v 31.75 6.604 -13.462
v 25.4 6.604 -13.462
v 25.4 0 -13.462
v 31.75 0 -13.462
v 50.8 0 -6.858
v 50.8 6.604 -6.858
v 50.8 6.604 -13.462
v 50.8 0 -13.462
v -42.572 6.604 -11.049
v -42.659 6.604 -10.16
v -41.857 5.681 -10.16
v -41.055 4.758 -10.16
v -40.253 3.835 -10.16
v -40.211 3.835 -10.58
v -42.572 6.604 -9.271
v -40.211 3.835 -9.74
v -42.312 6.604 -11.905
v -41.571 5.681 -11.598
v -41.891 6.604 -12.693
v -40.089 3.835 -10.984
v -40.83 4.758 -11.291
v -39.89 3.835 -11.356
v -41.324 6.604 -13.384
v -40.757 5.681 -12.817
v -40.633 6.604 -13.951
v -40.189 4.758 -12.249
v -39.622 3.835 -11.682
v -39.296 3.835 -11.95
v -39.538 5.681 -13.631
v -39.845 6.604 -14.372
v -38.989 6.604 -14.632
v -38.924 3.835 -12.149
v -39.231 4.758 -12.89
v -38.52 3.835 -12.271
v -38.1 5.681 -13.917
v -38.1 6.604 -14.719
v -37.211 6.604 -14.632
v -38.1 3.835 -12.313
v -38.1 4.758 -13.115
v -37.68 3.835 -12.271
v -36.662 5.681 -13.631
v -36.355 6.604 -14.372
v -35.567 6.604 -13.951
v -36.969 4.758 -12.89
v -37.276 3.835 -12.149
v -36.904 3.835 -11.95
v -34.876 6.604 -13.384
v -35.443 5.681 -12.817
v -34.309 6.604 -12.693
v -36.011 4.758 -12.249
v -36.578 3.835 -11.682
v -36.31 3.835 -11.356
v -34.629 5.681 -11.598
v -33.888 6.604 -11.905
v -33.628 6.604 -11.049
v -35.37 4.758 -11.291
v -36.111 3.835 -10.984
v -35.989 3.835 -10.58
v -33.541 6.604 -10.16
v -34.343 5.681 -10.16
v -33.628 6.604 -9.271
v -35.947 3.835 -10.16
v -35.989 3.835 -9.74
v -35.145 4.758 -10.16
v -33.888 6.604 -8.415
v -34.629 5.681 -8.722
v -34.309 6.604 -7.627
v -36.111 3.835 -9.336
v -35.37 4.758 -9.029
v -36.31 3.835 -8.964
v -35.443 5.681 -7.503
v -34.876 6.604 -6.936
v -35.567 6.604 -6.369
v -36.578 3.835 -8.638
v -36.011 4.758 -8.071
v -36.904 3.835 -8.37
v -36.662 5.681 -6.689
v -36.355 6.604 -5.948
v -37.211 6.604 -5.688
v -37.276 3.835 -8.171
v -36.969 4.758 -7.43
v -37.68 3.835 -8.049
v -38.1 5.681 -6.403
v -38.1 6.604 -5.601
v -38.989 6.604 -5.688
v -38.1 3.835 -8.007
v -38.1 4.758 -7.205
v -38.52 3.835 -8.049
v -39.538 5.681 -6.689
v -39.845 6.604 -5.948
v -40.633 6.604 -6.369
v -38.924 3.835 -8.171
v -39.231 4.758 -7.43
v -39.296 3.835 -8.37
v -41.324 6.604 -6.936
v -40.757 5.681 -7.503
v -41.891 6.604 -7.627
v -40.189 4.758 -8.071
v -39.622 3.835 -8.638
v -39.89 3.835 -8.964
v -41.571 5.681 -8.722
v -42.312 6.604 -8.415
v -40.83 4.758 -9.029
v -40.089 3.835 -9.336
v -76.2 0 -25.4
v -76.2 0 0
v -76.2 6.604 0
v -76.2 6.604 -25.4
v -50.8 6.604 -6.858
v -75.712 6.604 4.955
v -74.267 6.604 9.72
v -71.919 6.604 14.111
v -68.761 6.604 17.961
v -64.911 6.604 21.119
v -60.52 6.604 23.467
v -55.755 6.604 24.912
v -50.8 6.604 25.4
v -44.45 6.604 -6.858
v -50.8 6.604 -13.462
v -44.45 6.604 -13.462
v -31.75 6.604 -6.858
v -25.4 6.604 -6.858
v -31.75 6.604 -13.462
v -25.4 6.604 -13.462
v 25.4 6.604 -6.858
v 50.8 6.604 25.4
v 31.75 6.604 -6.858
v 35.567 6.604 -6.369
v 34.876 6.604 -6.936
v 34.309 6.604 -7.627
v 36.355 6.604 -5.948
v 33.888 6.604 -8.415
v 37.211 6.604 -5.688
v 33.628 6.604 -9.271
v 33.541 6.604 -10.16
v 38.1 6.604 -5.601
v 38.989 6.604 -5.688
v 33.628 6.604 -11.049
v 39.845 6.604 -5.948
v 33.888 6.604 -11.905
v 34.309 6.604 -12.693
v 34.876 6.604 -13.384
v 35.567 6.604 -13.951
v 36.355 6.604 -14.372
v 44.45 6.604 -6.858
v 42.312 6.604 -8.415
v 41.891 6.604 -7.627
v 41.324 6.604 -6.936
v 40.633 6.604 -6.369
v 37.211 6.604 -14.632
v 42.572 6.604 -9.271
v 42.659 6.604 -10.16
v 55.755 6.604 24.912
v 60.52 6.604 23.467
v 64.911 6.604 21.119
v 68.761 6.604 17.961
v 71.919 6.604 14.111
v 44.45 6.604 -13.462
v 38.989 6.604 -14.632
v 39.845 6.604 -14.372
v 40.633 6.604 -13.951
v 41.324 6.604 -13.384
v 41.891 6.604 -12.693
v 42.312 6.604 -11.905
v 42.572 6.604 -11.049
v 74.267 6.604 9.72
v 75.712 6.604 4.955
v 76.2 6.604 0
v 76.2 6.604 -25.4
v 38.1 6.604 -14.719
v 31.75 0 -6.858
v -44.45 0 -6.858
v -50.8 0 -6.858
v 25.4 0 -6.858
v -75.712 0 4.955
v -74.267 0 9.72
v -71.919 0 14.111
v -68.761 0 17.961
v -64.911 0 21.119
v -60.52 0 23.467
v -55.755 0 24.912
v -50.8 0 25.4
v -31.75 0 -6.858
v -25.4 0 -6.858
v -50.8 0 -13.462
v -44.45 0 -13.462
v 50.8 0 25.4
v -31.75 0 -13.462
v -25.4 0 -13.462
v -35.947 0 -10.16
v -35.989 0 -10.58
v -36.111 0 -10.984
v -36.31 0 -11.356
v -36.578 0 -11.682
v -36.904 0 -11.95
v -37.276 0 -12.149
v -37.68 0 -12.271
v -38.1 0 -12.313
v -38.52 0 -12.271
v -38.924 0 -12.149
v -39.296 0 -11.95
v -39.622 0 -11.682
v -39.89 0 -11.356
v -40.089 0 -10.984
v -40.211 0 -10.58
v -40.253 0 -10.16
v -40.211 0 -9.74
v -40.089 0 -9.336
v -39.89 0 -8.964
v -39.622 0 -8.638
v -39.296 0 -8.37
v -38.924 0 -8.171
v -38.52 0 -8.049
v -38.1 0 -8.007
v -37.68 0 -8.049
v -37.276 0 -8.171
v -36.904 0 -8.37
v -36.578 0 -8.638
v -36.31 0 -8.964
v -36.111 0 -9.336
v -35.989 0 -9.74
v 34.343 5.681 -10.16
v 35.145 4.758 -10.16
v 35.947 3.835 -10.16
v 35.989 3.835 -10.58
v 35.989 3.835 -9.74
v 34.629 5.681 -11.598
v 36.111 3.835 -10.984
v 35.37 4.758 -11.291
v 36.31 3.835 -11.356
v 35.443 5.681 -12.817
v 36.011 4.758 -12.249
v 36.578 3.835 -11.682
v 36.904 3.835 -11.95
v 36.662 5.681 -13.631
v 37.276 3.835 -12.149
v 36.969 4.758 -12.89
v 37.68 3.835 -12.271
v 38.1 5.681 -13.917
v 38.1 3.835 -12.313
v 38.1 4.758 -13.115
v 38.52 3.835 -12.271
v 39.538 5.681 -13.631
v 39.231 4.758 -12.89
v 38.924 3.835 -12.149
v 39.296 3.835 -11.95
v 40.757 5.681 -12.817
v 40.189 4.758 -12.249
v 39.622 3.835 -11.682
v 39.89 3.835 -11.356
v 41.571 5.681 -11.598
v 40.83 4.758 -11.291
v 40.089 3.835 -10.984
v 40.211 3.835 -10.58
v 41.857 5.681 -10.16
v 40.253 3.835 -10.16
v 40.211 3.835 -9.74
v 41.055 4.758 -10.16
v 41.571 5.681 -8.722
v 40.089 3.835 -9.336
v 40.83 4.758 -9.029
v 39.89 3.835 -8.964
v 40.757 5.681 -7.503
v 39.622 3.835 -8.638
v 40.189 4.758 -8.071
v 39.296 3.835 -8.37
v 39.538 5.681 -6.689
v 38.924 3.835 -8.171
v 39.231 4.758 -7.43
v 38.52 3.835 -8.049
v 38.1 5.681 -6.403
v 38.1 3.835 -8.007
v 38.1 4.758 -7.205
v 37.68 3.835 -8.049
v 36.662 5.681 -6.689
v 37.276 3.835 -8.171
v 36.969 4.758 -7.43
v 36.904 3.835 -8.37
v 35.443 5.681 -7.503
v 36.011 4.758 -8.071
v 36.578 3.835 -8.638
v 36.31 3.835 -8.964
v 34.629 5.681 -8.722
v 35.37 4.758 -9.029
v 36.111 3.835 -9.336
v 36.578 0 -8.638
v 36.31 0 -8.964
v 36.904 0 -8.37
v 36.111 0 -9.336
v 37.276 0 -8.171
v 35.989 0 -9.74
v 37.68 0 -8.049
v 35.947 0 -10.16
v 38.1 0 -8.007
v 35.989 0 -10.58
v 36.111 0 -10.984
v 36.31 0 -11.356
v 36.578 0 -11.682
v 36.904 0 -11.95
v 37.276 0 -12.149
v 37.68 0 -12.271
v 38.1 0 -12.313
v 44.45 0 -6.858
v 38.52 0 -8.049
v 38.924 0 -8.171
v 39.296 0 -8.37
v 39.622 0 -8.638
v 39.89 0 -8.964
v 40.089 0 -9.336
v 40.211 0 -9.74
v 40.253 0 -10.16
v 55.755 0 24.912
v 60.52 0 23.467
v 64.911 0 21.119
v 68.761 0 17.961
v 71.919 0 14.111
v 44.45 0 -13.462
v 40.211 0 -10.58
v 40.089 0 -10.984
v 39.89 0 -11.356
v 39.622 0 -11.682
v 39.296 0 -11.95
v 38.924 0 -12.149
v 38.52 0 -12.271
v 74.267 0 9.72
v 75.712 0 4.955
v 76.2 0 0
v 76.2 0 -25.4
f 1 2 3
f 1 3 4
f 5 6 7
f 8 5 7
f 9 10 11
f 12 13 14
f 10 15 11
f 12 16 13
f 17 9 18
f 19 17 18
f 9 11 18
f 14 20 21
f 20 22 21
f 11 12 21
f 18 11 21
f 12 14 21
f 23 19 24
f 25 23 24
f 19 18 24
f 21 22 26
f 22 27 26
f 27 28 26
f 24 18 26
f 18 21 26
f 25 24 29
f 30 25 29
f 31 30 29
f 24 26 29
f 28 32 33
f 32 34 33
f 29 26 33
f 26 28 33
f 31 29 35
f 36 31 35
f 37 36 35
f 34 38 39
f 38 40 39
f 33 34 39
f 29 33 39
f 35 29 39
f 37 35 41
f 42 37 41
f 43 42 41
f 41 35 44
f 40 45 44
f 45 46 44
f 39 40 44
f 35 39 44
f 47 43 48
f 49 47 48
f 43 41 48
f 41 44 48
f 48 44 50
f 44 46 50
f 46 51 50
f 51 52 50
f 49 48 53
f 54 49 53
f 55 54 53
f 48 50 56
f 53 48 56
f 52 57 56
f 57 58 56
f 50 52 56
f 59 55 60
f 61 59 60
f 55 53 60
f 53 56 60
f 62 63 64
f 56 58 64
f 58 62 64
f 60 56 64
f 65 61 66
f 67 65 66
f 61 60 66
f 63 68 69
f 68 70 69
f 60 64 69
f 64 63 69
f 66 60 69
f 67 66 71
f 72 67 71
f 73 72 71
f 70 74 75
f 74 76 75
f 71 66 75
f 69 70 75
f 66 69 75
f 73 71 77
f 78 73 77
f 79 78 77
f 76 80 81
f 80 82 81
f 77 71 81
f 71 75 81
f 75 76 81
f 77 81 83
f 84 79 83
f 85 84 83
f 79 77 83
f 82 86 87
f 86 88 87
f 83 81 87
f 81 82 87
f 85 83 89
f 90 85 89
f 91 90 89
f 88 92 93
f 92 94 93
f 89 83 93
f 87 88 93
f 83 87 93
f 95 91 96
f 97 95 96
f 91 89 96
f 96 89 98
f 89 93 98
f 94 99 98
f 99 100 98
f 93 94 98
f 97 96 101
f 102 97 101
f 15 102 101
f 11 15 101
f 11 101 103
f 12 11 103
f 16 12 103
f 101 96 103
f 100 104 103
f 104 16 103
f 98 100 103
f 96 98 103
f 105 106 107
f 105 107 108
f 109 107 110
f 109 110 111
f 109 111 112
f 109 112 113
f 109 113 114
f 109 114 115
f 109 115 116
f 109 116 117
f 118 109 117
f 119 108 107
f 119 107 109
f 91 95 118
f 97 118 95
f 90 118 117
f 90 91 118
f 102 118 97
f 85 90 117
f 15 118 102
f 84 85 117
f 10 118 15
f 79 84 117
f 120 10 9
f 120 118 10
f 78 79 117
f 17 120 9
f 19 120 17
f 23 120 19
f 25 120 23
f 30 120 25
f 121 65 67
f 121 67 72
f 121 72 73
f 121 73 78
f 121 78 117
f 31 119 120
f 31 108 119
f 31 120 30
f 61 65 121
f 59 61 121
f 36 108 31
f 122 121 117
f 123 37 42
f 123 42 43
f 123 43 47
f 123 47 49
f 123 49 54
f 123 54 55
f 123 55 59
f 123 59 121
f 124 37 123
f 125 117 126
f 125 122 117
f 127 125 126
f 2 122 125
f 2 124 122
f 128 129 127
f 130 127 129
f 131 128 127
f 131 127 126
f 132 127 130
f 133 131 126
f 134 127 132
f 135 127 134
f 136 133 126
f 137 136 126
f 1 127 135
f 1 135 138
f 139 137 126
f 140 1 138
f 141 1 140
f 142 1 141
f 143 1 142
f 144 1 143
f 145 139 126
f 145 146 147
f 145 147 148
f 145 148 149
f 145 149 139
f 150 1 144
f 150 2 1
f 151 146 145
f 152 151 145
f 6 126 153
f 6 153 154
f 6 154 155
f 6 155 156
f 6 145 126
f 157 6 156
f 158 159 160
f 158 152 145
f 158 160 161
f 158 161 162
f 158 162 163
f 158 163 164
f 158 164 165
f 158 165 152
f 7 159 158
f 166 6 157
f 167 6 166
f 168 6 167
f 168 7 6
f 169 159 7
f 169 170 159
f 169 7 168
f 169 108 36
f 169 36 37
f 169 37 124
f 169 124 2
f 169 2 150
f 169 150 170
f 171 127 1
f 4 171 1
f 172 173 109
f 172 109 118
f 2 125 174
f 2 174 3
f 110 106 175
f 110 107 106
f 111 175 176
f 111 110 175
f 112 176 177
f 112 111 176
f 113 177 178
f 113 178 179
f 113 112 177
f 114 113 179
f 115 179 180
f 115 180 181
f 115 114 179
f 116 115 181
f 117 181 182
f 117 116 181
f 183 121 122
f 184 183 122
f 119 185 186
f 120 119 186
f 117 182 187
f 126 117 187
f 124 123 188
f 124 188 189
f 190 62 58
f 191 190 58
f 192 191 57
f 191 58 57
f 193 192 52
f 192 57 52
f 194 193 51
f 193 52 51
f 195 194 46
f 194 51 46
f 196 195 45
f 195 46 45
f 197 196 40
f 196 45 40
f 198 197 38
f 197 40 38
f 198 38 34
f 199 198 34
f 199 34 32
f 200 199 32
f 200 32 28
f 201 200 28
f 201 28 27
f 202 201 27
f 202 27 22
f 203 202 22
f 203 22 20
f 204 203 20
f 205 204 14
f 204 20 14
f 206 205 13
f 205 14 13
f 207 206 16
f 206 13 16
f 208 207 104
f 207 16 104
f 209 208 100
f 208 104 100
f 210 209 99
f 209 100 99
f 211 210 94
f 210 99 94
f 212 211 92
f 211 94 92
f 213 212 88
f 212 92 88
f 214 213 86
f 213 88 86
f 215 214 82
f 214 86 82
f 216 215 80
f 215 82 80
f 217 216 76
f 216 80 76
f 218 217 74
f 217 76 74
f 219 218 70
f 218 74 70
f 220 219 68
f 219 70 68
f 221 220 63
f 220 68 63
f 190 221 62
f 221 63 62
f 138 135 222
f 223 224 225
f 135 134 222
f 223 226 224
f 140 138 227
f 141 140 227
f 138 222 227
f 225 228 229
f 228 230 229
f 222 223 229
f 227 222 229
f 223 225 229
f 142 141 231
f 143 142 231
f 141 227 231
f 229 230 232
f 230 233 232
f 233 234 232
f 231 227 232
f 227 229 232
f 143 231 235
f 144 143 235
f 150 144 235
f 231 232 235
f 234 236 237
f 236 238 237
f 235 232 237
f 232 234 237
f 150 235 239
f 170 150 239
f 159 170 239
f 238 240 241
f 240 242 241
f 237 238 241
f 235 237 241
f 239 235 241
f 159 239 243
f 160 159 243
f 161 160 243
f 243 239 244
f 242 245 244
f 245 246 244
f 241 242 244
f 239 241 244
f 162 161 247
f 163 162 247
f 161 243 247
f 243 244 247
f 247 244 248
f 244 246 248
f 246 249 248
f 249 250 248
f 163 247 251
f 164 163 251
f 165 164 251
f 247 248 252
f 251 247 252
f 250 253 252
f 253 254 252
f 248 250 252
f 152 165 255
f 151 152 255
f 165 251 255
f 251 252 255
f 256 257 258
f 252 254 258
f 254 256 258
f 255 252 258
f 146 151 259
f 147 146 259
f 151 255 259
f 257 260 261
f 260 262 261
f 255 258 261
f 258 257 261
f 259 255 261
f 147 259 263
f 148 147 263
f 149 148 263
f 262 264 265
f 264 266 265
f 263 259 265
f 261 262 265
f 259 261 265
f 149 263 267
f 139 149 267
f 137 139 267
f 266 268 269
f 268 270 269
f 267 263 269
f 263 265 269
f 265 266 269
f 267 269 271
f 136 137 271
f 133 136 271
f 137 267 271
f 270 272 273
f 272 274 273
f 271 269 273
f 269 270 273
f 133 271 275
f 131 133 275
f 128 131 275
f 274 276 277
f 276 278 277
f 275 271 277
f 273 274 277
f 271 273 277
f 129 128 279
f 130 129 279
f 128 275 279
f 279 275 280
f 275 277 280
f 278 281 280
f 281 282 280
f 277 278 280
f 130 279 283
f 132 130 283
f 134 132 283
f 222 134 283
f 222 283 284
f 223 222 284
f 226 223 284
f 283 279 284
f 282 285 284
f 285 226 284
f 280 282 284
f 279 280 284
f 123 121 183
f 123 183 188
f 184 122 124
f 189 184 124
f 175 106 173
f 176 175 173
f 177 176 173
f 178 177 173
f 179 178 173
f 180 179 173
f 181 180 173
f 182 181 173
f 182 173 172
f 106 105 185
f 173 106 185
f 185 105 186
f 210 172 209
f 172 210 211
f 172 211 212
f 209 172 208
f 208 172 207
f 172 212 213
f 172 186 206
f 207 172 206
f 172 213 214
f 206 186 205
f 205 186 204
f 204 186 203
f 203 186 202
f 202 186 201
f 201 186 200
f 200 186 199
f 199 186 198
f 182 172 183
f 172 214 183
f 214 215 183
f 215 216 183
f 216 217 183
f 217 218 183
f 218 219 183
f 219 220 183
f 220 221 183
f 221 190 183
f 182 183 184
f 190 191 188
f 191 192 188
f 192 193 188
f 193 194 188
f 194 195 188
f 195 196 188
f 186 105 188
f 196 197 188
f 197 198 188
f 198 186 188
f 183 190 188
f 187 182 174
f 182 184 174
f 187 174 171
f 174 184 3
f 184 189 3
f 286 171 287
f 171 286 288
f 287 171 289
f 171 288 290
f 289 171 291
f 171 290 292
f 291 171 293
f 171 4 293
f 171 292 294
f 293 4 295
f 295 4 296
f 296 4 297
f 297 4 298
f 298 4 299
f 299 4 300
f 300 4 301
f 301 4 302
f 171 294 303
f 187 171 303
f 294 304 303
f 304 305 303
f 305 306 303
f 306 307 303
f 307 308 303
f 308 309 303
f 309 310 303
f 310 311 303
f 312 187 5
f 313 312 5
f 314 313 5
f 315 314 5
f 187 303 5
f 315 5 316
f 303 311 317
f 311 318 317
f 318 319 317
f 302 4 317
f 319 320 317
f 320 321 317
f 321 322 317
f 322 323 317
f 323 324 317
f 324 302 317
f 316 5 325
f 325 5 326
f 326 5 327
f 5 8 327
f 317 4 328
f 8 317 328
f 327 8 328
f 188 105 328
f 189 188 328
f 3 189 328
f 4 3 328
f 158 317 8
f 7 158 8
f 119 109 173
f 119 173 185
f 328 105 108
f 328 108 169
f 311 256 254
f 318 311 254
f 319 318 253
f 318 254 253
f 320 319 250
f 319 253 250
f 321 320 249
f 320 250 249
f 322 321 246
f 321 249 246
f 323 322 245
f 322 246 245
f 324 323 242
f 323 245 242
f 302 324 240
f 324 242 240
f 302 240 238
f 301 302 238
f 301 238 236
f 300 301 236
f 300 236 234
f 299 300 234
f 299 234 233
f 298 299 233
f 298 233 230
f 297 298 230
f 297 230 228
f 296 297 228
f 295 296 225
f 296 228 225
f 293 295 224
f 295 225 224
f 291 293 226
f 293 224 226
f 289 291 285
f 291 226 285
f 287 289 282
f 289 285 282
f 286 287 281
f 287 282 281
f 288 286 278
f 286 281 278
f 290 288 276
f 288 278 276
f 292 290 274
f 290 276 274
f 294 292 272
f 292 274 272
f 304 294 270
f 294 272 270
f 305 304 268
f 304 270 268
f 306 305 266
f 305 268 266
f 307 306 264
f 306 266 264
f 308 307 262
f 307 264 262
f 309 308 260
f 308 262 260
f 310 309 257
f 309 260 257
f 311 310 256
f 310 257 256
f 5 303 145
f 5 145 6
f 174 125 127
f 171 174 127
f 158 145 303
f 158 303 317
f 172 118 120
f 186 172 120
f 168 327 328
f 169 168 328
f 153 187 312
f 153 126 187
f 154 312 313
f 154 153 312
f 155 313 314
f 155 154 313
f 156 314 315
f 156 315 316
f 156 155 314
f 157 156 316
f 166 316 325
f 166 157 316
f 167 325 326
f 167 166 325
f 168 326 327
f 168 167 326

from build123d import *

# Parameters (mm, degrees)
SKETCH1_W                                         = 152.4
SKETCH1_H                                         = 50.8
BOSS_EXTRUDE1_DEPTH                               = 6.604
FILLET1_R                                         = 25.4
SKETCH2_R                                         = 2.15265
SKETCH2_W                                         = 6.35
SKETCH2_H                                         = 6.604
CUT_EXTRUDE1_DEPTH                                = 7.604
CSK_FOR_8_FLAT_HEAD_SOCKET_CAP_SCREW1_D           = 4.3053
CSK_FOR_8_FLAT_HEAD_SOCKET_CAP_SCREW1_CSINK_D     = 9.1186
CSK_FOR_8_FLAT_HEAD_SOCKET_CAP_SCREW1_CSINK_ANGLE = 82


with BuildPart() as part:
    # Sketch1 → Boss-Extrude1 (new body)
    with BuildSketch(Plane(origin=(0, 0, 0), x_dir=(1, 0, 0), z_dir=(0, 1, 0))):
        Rectangle(SKETCH1_W, SKETCH1_H)
    extrude(amount=BOSS_EXTRUDE1_DEPTH)

    # Fillet1
    fillet1_edges = [part.edges().sort_by_distance(p)[0] for p in [
        (76.2, 3.302, 25.4),
        (-76.2, 3.302, 25.4),
    ]]
    fillet(fillet1_edges, radius=FILLET1_R)

    # Sketch2 → Cut-Extrude1 (cut, through all)
    with BuildSketch(Plane(origin=(0, 6.604, 0), x_dir=(1, 0, 0), z_dir=(0, 1, 0))):
        with Locations((-38.1, 10.16)):
            Circle(SKETCH2_R)
        with Locations((38.1, 10.16)):
            Circle(SKETCH2_R)
        with Locations((-28.575, 10.16)):
            Rectangle(SKETCH2_W, SKETCH2_H)
        with Locations((-47.625, 10.16)):
            Rectangle(SKETCH2_W, SKETCH2_H)
        with Locations((47.625, 10.16)):
            Rectangle(SKETCH2_W, SKETCH2_H)
        with Locations((28.575, 10.16)):
            Rectangle(SKETCH2_W, SKETCH2_H)
    extrude(amount=-CUT_EXTRUDE1_DEPTH, mode=Mode.SUBTRACT)

    # CSK for #8 Flat Head Socket Cap Screw1 (through all)
    with Locations(Plane(origin=(0, 6.604, 0), x_dir=(1, 0, 0), z_dir=(0, 1, 0))):
        with Locations((-38.1, 10.16), (38.1, 10.16)):
            CounterSinkHole(CSK_FOR_8_FLAT_HEAD_SOCKET_CAP_SCREW1_D / 2, CSK_FOR_8_FLAT_HEAD_SOCKET_CAP_SCREW1_CSINK_D / 2, counter_sink_angle=CSK_FOR_8_FLAT_HEAD_SOCKET_CAP_SCREW1_CSINK_ANGLE)


solid = part.part
